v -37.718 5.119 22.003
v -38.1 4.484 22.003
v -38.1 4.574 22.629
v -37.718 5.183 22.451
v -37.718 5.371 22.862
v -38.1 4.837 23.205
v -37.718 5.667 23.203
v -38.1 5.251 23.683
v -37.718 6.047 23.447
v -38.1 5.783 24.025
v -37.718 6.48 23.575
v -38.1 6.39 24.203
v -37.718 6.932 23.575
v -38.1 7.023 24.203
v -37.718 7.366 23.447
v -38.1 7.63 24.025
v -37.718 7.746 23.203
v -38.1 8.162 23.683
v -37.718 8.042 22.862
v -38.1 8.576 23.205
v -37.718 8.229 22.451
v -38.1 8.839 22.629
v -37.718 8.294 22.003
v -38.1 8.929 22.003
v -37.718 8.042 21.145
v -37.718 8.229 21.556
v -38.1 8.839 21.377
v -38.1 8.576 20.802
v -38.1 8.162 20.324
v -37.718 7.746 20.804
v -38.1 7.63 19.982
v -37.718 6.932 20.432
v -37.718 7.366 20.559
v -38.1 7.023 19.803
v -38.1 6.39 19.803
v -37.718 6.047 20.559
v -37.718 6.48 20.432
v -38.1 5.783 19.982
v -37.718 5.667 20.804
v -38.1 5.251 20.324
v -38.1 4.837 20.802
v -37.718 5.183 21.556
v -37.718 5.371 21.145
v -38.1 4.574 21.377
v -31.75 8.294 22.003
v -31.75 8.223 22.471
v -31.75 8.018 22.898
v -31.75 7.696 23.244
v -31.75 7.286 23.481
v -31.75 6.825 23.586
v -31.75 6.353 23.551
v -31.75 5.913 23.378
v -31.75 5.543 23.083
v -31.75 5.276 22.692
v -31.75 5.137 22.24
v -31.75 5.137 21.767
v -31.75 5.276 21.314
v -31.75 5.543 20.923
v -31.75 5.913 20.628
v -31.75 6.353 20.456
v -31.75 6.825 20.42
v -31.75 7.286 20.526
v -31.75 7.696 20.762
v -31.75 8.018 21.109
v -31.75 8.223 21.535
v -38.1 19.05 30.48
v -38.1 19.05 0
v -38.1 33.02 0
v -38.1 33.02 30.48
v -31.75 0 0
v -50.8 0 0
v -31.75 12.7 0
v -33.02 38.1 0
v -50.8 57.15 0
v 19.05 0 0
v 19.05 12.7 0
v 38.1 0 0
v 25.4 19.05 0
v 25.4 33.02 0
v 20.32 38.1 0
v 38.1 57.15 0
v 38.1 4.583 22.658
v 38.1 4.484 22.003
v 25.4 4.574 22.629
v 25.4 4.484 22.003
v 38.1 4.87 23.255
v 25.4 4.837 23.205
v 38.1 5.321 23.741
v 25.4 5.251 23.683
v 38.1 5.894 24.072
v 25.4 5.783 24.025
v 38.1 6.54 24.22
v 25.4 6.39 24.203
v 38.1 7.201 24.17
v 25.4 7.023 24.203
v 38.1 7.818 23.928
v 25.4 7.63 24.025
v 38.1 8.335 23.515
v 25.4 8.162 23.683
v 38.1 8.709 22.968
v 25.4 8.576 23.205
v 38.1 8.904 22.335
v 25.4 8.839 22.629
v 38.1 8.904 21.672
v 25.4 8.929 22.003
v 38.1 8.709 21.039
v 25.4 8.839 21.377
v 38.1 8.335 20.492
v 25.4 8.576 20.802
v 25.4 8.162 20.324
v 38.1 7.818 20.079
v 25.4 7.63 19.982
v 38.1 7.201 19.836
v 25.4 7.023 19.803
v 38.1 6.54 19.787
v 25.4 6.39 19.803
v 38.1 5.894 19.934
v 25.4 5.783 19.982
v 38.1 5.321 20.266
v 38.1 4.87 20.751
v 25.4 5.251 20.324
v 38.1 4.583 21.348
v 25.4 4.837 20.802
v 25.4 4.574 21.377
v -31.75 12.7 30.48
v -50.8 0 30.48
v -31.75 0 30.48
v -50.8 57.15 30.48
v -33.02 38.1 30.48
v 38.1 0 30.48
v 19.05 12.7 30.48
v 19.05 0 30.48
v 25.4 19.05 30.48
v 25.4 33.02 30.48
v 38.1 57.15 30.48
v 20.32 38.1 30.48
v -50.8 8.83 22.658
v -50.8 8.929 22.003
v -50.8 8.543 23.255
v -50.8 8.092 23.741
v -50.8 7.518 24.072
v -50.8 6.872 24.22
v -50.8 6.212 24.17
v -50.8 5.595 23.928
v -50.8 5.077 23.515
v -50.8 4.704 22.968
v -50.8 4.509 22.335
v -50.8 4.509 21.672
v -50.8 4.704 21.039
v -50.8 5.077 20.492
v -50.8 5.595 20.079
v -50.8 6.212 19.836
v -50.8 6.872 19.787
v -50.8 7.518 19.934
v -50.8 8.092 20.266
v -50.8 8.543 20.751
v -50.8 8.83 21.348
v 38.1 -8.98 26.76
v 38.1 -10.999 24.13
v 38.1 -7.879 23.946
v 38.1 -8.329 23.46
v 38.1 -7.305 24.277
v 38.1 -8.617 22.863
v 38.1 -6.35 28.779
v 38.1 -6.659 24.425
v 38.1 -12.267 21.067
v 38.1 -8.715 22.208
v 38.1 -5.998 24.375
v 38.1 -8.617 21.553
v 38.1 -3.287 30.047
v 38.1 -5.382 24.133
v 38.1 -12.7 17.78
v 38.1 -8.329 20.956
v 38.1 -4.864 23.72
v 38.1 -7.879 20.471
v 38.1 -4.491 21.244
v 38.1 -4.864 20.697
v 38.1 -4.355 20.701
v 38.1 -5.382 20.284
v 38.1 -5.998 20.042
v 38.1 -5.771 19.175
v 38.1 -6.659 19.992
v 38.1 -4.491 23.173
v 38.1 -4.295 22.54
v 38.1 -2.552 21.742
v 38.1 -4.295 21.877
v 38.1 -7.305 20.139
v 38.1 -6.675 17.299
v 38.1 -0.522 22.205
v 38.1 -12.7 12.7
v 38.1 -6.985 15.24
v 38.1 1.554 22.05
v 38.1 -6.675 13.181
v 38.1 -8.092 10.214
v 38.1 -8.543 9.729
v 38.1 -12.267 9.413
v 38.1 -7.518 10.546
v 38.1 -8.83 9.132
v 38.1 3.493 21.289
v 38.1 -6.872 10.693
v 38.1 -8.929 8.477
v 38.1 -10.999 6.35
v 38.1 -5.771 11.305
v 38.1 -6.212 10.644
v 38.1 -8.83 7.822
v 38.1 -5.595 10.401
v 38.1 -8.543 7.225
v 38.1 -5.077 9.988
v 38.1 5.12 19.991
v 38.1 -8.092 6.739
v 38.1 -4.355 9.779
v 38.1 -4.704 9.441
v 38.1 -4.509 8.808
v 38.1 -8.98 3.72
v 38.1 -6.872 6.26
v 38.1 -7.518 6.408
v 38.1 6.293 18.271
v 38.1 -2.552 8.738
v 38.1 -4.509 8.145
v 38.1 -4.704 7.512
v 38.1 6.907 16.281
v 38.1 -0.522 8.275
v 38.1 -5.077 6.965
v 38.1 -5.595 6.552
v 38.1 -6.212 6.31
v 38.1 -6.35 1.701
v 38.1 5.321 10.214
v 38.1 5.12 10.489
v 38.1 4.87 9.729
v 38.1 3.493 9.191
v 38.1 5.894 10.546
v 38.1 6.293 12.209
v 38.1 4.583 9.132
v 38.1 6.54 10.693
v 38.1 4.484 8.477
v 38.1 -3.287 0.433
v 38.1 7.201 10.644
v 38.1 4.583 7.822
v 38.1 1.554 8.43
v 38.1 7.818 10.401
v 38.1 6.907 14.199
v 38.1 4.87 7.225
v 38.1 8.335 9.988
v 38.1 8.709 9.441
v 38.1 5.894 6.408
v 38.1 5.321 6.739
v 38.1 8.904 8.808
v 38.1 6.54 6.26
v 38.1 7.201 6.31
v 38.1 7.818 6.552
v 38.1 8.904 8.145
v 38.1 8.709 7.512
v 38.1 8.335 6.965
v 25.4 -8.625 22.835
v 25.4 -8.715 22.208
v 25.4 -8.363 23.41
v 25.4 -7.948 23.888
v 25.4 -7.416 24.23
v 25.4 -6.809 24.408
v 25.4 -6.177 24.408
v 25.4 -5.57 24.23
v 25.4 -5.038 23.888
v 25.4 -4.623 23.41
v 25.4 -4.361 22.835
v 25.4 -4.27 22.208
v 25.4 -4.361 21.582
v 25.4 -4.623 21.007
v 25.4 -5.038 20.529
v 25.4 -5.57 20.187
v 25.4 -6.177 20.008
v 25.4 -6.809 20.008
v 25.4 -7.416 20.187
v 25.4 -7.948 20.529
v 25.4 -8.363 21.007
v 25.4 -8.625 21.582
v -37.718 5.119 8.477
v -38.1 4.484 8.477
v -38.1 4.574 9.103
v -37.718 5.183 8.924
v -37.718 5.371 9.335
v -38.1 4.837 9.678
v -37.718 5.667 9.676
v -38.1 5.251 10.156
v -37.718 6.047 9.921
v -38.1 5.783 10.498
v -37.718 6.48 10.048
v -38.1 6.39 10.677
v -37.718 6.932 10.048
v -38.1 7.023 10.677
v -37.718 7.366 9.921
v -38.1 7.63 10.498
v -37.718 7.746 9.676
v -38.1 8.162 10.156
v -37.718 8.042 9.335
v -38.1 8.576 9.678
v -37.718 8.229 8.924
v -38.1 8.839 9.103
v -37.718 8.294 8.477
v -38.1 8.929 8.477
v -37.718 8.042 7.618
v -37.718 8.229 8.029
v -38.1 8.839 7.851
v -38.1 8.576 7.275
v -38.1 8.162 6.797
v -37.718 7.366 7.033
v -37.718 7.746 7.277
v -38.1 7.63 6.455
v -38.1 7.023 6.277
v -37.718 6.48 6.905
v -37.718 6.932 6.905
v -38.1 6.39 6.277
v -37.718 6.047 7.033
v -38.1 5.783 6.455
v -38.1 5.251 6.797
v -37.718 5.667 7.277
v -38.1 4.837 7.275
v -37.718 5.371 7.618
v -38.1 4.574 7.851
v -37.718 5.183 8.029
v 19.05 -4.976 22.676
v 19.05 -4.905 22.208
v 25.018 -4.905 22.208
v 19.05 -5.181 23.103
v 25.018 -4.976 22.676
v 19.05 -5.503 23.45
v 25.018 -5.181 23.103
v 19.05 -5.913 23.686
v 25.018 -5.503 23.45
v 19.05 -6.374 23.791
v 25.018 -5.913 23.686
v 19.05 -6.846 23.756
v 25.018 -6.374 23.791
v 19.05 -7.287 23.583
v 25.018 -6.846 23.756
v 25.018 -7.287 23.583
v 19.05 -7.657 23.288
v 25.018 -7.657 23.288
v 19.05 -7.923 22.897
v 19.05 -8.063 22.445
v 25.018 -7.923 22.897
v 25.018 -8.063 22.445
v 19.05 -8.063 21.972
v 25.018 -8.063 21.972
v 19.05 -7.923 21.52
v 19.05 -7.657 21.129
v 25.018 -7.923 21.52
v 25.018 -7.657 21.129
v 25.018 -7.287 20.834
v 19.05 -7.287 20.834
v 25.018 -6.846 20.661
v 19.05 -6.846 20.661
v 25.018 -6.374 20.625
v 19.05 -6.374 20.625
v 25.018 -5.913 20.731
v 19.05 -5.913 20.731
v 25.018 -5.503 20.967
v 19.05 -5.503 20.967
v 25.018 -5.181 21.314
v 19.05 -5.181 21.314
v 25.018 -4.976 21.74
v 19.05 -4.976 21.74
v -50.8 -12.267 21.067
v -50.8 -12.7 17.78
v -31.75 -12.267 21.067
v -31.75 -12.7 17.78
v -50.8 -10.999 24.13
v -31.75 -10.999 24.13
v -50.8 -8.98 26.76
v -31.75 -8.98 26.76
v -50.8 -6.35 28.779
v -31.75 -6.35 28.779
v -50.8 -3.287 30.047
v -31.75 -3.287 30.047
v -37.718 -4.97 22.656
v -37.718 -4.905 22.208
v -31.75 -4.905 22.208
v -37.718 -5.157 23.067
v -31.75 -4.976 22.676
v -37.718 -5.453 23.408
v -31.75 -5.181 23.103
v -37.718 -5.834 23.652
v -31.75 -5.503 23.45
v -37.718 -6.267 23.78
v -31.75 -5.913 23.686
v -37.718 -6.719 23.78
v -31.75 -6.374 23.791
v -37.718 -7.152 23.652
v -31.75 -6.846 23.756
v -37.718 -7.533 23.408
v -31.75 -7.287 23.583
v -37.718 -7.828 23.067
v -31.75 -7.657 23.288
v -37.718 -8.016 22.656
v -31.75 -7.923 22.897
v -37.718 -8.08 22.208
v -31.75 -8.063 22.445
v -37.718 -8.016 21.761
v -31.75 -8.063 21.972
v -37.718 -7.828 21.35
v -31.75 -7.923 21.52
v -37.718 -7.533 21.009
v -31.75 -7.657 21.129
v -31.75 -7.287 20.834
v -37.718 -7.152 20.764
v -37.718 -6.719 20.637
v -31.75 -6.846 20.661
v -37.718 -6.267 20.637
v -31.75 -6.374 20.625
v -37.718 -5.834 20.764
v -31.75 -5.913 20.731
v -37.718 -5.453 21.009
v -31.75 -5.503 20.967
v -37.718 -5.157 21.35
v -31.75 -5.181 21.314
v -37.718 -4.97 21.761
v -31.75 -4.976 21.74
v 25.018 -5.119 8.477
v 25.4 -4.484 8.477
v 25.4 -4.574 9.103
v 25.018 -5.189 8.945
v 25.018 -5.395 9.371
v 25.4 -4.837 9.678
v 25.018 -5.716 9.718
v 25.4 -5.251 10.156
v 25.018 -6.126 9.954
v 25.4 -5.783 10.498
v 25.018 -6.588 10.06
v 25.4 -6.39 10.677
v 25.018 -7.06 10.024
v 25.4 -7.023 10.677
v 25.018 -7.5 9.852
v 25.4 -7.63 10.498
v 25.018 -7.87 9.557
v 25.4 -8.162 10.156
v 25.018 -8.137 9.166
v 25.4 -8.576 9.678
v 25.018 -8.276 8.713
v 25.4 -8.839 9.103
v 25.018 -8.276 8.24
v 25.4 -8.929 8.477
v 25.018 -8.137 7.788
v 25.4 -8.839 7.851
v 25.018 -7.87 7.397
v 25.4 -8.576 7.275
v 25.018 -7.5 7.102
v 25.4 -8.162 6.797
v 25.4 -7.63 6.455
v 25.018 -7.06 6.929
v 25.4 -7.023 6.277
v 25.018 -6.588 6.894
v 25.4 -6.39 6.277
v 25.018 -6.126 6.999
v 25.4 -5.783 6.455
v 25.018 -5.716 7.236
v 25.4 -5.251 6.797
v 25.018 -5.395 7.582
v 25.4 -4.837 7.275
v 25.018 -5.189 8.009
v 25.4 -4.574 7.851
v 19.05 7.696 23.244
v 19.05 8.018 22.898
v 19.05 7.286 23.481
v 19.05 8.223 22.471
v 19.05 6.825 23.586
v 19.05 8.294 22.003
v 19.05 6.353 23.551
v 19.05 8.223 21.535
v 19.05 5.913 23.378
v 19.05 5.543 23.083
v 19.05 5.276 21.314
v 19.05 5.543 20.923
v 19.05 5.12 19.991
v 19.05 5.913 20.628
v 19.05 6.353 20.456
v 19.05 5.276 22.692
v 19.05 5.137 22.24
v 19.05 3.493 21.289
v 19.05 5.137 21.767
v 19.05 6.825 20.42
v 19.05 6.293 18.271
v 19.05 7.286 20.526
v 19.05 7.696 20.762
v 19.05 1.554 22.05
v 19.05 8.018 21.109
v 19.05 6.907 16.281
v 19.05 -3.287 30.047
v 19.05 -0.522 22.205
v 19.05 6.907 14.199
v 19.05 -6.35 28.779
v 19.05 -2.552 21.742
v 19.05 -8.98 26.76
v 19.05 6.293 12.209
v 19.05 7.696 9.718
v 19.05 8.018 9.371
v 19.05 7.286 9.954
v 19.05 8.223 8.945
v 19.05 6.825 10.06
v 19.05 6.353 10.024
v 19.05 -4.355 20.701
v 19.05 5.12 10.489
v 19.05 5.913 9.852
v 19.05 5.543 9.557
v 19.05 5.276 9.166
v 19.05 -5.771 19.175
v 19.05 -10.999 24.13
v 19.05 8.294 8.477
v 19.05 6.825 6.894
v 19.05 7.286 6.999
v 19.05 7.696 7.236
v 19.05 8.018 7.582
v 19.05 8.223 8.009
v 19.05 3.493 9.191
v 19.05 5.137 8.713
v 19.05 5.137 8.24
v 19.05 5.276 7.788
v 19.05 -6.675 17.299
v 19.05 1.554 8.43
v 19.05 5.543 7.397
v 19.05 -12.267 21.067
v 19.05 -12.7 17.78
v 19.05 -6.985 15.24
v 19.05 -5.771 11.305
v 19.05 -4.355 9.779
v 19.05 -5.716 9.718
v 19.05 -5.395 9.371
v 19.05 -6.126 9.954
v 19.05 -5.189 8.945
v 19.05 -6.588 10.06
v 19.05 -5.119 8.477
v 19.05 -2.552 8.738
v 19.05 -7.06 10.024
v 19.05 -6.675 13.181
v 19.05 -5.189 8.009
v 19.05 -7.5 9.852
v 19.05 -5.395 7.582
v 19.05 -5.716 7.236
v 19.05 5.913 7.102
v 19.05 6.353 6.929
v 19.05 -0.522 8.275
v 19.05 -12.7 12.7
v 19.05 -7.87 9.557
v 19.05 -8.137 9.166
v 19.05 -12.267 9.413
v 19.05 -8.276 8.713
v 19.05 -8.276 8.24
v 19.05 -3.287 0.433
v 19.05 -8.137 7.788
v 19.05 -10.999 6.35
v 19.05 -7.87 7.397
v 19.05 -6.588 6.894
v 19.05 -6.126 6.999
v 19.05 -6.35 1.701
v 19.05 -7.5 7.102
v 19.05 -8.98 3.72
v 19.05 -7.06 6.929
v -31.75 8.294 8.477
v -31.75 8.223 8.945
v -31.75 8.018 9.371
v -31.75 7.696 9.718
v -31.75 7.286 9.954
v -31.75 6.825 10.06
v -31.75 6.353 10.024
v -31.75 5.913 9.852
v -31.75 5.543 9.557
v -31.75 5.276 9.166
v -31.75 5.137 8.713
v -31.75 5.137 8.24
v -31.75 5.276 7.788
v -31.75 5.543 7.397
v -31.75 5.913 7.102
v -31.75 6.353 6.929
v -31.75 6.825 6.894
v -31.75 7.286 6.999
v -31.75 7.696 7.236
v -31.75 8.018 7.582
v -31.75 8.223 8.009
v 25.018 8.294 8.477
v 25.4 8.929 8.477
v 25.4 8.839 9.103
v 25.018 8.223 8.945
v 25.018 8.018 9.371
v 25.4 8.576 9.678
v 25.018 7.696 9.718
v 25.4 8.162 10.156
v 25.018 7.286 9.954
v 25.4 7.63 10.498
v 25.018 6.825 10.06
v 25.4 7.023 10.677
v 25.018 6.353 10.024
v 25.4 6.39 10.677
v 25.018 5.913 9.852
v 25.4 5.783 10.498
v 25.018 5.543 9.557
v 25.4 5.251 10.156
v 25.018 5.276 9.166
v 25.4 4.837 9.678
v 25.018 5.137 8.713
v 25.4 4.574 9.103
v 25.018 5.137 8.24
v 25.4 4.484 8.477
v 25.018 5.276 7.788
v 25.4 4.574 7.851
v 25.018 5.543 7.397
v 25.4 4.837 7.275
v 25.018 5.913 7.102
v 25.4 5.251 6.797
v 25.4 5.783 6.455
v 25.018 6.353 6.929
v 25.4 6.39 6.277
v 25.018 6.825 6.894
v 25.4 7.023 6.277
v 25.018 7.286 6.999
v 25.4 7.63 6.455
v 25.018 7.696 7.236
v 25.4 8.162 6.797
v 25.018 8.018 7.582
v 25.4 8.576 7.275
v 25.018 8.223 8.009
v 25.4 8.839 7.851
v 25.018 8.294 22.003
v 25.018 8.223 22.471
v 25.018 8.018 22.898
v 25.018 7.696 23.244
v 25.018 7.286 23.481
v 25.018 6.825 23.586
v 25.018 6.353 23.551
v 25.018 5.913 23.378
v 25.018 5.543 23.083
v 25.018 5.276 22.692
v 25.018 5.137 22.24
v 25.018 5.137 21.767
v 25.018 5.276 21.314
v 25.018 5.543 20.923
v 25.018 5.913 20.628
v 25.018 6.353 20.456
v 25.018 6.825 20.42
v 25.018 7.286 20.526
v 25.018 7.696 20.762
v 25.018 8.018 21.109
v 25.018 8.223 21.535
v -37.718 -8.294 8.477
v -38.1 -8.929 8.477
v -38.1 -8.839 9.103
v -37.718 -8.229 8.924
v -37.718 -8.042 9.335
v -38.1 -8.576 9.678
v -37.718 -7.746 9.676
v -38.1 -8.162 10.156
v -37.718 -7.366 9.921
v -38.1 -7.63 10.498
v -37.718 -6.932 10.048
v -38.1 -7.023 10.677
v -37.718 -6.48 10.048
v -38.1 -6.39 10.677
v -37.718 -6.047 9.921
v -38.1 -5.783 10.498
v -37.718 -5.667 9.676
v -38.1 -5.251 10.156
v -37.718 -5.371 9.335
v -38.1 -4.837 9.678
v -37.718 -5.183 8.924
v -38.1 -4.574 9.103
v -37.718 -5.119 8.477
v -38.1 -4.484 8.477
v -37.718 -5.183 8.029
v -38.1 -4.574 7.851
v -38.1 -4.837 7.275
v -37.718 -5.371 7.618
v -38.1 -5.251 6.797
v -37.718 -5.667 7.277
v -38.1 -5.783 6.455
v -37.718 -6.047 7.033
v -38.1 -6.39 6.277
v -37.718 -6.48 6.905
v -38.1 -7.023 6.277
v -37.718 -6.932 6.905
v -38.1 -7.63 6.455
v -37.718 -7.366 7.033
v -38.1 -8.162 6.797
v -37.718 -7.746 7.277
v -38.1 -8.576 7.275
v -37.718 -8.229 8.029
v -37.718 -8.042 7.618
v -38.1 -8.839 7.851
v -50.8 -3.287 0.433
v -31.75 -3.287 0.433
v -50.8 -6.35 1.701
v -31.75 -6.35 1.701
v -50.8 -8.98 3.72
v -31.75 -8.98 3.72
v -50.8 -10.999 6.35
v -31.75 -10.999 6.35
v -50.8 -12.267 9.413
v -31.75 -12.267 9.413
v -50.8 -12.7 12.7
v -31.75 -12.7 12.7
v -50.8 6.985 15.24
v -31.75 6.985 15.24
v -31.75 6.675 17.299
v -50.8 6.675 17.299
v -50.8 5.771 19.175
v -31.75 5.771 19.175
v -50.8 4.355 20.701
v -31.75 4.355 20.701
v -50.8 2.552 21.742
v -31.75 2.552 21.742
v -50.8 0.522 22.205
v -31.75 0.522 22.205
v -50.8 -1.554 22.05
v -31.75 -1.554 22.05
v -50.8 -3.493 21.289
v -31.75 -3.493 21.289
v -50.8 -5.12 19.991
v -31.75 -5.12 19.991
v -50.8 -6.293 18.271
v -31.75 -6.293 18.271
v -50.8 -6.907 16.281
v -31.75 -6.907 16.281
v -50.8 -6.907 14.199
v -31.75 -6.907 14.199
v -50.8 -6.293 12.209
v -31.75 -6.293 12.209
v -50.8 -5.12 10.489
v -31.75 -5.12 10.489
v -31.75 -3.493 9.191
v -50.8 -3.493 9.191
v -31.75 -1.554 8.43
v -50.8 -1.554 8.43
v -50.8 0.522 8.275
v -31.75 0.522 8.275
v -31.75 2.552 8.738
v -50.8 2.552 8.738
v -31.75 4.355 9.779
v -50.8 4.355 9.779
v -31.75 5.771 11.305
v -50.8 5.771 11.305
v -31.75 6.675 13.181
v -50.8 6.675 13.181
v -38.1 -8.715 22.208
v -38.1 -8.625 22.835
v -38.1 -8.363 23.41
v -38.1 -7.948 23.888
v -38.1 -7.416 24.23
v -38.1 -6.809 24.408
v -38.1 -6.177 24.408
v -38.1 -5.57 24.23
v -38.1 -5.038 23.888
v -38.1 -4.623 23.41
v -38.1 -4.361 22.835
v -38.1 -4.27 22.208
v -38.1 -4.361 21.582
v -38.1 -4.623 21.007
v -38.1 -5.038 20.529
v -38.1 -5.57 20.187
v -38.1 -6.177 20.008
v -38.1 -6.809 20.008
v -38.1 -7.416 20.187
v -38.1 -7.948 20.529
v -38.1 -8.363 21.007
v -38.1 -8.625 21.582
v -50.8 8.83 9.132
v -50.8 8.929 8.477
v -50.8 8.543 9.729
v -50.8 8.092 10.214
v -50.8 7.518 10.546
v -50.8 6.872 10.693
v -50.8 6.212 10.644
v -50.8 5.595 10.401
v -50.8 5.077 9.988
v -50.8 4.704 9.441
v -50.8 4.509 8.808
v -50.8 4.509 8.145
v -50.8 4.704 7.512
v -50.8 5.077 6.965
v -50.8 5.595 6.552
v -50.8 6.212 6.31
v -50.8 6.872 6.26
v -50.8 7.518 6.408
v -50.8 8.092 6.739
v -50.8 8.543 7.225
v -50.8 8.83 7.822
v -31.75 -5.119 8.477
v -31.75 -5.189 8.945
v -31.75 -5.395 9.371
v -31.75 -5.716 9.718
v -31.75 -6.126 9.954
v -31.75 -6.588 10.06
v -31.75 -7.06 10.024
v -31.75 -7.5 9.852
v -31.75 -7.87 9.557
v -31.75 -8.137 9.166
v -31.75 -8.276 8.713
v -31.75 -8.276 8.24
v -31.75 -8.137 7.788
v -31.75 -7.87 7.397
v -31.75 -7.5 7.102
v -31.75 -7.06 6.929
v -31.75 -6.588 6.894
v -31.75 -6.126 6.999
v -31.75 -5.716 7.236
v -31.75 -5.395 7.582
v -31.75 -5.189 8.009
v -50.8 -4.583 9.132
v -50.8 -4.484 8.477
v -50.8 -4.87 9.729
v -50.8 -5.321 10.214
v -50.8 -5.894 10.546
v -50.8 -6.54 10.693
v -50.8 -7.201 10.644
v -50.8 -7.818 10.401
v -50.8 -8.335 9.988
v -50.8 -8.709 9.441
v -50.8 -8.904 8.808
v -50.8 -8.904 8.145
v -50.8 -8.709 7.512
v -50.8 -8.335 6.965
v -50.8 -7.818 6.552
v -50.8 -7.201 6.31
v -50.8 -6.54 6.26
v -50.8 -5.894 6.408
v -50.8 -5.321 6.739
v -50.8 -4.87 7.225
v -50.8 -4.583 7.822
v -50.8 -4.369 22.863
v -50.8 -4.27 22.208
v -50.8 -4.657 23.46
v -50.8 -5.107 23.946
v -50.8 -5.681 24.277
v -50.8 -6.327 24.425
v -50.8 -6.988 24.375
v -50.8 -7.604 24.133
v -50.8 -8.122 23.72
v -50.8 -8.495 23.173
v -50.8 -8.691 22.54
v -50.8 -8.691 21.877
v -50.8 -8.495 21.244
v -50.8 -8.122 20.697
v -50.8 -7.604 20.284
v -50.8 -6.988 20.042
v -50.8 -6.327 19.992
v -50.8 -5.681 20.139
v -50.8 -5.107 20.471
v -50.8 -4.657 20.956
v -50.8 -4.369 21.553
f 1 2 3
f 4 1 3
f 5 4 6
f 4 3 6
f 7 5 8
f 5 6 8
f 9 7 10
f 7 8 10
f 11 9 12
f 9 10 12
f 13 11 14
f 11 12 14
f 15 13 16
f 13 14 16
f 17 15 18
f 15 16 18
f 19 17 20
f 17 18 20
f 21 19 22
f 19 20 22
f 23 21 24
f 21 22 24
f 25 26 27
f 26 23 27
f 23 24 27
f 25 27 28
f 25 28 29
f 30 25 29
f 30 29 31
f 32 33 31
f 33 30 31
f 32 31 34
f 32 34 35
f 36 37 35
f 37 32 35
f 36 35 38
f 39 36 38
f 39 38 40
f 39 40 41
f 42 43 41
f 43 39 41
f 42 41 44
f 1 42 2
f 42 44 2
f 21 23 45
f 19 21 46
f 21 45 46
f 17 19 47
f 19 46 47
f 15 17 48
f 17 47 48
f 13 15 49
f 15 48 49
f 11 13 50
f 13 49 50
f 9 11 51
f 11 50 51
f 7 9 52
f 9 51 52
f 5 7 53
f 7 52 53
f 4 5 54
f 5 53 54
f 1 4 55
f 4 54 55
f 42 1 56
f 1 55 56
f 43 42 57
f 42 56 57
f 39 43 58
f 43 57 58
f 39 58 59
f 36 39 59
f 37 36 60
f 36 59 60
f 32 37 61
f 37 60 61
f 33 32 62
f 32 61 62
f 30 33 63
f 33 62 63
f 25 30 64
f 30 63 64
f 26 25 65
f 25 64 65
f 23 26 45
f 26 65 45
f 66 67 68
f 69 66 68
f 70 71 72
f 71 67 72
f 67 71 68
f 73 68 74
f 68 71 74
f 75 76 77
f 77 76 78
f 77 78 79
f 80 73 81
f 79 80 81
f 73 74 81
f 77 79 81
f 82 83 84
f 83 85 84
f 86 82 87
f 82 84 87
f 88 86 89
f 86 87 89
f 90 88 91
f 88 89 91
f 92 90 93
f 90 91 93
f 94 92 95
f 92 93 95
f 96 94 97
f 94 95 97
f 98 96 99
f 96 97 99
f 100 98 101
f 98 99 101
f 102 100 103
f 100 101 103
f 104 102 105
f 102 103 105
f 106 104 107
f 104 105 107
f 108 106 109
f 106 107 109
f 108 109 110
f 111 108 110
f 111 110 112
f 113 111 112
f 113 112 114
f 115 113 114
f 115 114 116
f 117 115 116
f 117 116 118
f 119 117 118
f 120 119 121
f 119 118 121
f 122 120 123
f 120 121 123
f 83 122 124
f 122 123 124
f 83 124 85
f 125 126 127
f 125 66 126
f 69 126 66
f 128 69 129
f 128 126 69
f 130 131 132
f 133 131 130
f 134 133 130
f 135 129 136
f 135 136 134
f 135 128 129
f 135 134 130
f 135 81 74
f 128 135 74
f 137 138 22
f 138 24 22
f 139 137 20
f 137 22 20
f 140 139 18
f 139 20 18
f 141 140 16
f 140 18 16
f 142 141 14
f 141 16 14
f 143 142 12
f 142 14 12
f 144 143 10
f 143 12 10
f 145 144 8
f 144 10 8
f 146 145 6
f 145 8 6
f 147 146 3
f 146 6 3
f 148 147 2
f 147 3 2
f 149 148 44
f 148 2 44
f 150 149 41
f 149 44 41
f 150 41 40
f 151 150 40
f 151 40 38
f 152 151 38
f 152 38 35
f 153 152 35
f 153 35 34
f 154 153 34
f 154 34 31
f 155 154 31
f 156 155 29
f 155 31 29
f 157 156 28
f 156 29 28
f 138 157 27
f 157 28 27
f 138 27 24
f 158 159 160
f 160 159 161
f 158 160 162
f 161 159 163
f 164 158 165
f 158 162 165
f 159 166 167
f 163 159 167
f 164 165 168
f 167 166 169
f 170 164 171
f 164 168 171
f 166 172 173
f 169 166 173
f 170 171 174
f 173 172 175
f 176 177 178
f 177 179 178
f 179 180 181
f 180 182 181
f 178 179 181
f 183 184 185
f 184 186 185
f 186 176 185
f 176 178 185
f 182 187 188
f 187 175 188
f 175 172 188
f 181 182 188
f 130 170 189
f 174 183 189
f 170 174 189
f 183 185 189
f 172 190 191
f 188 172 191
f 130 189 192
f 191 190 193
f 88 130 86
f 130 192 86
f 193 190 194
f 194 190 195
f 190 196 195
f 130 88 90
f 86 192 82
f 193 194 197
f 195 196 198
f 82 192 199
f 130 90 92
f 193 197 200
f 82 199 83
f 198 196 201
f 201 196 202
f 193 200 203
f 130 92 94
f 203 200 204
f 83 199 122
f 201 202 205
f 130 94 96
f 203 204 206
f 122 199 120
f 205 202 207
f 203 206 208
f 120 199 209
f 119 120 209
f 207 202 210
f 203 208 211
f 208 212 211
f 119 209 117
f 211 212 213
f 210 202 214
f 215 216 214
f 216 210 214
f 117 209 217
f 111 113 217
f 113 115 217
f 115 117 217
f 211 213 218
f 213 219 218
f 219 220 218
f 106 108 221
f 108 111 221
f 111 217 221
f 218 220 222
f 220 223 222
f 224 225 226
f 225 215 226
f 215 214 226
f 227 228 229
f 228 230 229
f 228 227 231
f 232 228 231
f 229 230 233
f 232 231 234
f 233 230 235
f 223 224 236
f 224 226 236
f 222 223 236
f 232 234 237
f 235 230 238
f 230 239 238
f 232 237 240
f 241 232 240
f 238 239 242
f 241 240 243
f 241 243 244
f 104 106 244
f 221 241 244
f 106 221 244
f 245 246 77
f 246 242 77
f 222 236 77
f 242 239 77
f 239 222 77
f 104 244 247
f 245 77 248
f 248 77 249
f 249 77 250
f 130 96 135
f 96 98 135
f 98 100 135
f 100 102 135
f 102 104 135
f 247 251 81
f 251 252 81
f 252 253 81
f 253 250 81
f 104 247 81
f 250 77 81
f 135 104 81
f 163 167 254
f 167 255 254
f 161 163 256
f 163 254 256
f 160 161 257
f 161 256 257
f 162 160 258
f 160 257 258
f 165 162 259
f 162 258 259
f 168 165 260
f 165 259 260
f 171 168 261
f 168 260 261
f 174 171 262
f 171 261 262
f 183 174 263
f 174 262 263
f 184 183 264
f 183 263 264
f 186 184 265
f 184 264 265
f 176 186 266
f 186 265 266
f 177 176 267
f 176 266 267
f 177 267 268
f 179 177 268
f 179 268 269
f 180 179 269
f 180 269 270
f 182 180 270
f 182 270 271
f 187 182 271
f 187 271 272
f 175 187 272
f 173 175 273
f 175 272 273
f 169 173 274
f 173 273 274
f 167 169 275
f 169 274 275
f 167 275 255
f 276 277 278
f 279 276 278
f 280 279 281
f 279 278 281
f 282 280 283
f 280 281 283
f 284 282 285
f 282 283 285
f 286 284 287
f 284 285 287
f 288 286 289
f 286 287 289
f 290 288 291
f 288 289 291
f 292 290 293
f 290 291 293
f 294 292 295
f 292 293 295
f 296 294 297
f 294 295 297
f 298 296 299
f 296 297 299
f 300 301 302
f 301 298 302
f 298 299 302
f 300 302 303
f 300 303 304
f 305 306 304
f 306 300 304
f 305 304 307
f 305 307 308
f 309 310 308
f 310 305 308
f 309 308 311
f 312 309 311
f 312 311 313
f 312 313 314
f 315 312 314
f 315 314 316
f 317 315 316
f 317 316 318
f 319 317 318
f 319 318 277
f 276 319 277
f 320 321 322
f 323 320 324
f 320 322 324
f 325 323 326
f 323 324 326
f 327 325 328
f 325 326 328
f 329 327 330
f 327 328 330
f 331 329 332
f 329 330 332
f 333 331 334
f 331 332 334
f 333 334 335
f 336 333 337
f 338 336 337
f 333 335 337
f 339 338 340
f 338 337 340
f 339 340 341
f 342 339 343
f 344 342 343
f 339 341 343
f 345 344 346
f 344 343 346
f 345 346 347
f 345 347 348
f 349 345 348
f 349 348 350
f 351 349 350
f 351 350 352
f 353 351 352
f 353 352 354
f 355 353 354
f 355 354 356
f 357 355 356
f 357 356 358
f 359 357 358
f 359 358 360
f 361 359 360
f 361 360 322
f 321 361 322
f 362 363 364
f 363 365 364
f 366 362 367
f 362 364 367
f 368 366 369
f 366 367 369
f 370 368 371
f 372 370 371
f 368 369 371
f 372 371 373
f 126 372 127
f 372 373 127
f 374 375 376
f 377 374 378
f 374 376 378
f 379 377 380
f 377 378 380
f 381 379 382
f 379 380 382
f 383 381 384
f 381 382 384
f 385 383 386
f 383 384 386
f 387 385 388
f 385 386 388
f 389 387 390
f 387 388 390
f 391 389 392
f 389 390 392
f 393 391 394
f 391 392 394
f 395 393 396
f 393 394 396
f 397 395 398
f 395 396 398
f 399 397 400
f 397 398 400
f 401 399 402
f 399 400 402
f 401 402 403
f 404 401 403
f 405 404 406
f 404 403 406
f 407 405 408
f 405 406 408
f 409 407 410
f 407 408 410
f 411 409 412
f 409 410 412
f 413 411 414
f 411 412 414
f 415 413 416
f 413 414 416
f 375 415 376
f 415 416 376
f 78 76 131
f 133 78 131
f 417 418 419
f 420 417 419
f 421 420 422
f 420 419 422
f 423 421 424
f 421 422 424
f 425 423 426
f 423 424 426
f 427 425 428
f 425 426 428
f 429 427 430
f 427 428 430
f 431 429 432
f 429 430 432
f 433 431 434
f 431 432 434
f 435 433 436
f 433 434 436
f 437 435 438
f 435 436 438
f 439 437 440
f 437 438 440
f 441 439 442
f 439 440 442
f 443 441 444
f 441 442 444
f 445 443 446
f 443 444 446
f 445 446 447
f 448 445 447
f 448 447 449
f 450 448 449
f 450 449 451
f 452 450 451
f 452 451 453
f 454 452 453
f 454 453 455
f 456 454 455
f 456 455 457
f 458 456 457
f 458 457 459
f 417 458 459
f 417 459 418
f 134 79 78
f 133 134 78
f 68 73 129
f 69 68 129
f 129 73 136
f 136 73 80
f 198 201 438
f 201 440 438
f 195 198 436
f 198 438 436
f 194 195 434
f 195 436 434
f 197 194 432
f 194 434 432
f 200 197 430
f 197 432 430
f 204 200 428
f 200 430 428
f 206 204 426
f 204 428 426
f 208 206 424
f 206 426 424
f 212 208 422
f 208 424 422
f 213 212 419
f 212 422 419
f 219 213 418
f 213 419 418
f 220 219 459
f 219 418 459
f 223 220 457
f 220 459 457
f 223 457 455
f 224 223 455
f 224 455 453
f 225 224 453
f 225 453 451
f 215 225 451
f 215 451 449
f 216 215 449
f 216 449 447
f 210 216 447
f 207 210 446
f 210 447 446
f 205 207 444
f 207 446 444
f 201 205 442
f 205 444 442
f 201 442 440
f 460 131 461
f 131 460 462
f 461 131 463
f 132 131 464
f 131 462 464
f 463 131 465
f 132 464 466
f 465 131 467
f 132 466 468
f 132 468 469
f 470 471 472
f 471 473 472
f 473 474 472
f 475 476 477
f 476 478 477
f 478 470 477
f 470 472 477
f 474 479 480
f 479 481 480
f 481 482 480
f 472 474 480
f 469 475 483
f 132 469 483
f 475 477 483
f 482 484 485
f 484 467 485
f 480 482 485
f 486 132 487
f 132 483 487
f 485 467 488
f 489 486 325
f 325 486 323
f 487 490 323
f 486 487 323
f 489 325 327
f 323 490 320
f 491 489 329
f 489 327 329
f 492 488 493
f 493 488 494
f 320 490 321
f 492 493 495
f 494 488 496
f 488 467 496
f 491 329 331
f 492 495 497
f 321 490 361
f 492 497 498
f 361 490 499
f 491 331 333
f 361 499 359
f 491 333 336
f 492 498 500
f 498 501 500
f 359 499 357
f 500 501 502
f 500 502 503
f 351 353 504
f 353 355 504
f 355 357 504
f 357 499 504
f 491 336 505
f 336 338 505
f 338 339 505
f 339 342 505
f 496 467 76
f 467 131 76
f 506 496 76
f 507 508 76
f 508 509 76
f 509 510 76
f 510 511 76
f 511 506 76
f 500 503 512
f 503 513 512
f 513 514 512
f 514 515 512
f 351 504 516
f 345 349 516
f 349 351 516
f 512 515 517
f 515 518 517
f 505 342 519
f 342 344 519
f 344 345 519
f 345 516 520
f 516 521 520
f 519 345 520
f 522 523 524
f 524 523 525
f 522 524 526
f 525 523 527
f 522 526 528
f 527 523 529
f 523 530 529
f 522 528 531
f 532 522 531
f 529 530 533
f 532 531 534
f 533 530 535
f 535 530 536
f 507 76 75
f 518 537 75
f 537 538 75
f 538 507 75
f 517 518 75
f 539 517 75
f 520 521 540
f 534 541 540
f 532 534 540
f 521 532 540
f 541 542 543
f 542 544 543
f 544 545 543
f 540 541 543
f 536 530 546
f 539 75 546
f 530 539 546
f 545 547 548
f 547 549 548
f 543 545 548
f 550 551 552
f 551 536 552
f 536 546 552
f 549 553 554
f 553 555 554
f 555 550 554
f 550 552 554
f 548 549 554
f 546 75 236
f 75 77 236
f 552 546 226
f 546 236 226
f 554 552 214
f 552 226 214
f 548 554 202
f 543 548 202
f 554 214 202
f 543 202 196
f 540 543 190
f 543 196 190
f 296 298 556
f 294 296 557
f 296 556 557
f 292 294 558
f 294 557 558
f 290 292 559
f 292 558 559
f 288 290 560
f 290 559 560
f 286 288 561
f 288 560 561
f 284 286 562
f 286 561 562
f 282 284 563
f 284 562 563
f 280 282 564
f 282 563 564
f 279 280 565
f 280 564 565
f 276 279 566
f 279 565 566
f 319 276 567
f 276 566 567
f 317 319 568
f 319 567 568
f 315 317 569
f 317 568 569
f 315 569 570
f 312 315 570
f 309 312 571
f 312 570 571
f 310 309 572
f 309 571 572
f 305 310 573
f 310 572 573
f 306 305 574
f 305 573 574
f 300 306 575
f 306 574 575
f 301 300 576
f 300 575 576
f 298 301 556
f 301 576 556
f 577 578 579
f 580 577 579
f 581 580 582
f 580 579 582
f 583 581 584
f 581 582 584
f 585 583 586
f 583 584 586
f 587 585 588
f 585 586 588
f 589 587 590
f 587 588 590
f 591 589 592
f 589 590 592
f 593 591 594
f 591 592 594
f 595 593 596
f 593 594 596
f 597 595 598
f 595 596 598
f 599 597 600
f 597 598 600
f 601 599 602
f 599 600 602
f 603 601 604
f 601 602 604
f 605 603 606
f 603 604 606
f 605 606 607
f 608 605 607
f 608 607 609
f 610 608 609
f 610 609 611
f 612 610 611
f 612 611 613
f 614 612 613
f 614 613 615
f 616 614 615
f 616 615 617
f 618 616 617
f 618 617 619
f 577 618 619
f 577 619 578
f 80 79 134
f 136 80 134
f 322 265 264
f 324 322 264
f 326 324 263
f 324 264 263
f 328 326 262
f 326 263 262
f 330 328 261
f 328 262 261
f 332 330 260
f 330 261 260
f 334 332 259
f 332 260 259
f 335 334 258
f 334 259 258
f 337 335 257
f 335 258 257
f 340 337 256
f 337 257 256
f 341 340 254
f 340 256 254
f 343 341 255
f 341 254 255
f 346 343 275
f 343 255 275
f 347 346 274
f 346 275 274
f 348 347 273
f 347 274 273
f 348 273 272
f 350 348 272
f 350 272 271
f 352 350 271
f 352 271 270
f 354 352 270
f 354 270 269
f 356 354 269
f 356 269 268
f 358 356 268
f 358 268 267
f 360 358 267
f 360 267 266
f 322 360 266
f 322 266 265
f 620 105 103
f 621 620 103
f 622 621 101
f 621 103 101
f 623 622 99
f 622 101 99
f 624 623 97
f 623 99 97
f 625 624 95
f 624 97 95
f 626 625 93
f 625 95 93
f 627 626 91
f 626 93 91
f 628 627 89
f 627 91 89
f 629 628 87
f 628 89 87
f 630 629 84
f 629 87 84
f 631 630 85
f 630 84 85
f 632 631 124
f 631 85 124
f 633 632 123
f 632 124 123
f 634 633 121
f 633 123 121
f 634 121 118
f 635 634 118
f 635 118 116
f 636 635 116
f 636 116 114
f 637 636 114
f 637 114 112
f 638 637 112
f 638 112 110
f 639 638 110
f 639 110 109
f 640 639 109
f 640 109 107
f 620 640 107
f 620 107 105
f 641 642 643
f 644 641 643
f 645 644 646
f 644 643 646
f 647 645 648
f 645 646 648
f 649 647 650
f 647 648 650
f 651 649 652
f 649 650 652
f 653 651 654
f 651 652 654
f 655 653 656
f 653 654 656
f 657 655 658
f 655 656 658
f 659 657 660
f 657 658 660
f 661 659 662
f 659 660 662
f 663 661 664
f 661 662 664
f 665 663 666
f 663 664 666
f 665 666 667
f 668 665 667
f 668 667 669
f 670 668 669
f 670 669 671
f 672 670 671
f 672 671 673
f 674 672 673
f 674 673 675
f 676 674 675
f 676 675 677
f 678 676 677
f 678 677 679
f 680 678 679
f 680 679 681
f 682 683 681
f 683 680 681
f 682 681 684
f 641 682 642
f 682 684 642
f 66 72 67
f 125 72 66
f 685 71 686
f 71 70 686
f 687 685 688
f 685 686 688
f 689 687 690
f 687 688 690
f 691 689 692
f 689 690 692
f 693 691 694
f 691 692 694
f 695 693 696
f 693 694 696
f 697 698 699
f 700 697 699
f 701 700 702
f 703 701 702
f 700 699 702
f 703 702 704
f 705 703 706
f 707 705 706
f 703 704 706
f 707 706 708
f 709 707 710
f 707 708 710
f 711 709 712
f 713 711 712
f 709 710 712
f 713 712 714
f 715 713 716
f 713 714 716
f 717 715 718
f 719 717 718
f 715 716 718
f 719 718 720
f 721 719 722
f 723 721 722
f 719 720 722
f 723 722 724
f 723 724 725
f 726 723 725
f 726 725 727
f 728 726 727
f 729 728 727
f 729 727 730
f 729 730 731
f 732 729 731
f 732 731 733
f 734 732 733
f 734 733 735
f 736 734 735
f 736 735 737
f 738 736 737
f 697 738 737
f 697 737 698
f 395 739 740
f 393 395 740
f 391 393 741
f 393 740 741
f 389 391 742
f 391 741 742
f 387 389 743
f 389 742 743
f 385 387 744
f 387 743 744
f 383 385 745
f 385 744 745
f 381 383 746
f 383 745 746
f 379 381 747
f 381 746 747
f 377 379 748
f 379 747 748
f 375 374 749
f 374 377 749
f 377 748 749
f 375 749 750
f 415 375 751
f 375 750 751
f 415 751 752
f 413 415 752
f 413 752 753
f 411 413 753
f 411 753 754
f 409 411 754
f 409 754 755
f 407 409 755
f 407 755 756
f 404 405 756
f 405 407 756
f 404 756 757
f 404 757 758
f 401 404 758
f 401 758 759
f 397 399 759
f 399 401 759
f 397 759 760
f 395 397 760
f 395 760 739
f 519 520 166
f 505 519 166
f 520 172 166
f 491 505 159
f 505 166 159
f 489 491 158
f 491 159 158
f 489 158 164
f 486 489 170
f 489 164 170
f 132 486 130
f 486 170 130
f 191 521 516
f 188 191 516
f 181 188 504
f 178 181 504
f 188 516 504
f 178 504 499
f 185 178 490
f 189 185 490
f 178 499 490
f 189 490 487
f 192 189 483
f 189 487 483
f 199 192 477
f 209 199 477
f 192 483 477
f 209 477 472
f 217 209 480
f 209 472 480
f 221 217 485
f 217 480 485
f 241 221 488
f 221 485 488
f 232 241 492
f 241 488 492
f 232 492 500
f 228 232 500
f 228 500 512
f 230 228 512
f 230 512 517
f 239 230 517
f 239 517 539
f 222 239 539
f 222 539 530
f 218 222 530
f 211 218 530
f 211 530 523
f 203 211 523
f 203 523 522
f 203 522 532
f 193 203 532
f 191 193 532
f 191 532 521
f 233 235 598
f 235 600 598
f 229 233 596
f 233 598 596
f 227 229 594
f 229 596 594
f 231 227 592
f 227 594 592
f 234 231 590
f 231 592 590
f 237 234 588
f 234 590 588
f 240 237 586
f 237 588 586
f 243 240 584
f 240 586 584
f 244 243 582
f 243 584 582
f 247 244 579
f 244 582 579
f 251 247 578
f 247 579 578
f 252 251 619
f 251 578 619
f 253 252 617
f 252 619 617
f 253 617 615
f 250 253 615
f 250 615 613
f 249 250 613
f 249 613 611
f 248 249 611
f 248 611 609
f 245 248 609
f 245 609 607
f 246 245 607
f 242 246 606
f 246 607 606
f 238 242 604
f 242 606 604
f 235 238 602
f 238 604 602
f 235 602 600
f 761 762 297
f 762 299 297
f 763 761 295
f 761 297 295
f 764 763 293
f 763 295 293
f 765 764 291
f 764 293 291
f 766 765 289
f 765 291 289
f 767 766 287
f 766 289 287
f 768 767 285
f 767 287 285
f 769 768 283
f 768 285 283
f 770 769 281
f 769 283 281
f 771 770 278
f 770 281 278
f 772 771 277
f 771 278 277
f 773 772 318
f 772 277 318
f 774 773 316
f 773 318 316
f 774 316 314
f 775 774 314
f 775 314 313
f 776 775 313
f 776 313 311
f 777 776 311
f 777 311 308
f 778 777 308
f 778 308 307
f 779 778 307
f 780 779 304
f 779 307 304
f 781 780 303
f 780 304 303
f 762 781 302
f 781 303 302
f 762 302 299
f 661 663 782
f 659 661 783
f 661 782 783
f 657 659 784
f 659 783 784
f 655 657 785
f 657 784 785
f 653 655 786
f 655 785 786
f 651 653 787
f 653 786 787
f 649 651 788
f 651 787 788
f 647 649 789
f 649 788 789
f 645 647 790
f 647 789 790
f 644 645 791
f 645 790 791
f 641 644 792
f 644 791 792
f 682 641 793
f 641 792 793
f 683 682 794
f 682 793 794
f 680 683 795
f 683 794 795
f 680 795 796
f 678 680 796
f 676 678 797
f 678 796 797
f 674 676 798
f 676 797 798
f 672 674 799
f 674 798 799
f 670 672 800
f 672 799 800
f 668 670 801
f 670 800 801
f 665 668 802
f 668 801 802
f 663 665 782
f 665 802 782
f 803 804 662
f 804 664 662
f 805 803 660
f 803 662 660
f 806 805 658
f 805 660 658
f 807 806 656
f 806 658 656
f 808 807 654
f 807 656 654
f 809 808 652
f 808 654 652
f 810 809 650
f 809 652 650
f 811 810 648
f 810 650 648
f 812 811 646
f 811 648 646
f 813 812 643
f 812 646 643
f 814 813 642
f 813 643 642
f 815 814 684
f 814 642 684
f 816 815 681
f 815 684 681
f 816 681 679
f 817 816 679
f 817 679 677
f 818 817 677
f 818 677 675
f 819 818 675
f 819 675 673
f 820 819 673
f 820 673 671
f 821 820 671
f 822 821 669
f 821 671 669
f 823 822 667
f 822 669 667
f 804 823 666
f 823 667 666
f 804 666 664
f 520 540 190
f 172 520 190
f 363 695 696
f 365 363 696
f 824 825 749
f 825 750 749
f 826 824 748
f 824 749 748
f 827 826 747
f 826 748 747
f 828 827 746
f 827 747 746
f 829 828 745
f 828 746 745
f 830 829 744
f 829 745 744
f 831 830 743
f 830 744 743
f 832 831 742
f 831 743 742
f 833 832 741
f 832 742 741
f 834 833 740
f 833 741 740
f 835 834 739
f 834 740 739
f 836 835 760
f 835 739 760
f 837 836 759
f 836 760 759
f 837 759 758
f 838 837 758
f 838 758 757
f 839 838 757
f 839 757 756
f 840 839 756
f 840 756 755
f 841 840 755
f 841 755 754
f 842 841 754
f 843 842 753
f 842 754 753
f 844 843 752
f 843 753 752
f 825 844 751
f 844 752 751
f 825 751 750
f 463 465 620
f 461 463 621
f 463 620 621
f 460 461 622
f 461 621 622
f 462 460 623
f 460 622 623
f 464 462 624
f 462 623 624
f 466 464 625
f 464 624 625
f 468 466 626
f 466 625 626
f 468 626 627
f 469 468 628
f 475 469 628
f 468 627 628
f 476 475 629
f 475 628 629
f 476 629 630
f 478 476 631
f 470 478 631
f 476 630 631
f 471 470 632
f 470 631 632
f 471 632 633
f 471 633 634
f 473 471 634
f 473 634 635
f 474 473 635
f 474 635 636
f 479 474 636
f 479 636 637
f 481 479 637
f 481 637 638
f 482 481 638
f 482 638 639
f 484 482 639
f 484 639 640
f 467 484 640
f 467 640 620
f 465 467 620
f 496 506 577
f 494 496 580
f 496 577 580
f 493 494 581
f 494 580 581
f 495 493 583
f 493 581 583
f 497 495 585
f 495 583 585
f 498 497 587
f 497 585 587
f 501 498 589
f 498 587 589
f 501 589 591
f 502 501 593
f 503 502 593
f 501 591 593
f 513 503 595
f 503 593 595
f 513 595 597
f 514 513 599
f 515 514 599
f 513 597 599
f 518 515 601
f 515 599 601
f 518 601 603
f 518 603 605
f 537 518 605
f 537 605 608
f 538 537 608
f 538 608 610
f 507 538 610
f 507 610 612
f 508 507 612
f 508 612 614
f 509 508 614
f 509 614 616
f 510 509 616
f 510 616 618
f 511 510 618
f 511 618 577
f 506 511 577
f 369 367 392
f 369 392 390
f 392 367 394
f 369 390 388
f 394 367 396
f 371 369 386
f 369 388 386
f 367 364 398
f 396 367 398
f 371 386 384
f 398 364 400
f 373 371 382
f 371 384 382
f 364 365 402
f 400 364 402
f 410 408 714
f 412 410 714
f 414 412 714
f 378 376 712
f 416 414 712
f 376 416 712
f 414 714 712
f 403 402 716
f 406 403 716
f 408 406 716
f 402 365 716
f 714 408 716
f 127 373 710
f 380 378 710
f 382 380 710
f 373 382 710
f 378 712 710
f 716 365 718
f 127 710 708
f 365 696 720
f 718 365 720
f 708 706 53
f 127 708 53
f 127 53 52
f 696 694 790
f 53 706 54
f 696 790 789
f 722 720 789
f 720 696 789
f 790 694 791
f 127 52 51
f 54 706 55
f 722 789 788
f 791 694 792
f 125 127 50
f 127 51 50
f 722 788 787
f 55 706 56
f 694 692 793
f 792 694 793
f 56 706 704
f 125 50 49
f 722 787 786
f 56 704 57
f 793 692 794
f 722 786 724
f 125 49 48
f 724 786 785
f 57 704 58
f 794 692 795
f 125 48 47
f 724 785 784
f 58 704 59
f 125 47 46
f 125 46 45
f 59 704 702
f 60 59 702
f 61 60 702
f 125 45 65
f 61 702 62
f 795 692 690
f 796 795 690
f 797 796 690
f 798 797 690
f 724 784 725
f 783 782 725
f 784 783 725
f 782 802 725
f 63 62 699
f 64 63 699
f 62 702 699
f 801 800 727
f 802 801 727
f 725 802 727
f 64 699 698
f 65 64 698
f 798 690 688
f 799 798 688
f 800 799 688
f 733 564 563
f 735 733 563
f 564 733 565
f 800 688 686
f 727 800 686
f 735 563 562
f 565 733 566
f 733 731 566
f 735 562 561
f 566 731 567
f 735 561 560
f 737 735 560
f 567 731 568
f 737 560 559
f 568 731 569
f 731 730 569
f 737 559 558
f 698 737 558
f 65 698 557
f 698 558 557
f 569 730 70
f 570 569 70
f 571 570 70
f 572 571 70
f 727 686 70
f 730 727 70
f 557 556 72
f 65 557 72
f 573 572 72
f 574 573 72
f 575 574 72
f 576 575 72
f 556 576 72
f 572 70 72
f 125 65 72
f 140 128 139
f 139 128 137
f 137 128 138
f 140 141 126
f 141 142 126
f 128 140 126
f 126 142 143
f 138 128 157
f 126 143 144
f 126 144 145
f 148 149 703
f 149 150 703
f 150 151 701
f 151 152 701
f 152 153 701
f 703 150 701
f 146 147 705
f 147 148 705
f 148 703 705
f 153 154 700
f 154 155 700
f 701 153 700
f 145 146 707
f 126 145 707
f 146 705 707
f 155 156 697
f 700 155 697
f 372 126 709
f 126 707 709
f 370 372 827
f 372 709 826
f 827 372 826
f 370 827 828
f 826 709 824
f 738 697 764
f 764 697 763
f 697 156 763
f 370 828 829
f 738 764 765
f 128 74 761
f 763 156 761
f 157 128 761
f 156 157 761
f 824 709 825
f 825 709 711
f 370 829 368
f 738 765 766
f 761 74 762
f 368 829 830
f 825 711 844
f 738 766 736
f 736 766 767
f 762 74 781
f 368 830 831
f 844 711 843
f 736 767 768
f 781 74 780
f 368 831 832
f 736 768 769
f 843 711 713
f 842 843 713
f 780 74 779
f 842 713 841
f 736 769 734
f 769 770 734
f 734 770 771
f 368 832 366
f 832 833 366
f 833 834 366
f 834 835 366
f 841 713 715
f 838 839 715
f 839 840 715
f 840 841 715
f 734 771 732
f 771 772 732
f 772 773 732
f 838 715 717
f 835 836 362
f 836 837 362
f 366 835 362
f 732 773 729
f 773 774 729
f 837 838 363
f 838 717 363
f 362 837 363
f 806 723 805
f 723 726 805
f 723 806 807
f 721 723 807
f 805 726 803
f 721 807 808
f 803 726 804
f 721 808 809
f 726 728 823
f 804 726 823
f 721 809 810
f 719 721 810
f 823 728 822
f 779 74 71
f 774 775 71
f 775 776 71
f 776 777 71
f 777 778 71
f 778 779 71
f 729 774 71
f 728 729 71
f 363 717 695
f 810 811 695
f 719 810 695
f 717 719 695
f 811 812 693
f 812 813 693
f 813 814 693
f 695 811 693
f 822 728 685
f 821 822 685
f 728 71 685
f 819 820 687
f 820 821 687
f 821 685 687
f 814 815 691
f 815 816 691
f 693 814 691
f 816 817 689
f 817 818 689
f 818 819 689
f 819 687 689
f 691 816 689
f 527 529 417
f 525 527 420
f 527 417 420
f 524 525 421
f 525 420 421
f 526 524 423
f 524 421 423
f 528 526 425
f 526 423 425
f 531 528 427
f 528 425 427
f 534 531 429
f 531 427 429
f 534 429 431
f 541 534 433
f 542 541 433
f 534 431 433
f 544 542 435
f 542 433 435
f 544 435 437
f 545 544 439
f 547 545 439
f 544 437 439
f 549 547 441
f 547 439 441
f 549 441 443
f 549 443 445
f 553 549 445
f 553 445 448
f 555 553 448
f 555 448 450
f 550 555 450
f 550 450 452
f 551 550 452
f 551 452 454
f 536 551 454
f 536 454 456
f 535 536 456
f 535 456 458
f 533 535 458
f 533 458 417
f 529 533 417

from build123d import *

# Parameters (mm, degrees)
F1_DEPTH       = 30.48
F4_D           = 13.97
F4_DEPTH       = 19.051
F4_ON_F2_D     = 13.97
F4_ON_F2_DEPTH = 19.051
F6_D           = 3.175
F8_SIZE        = 5.08
F9_SIZE        = 6.34999
F10_D          = 4.445
F10_DEPTH      = 12.7
F10_TIP        = 1.3354127258
F12_D          = 4.445
F12_DEPTH      = 12.7
F12_TIP        = 1.3354127258
F13_R          = 12.7


# Not quite as in the source:
# - a fillet or chamfer is up to 0.001 mm smaller than in the source, because OpenCascade refuses the exact size
# - a feature names something its author has since deleted; it is built from what else it names


with BuildPart() as f1:
    # F0 (on Top) → F1 (new body)
    with BuildSketch(Plane.XY):
        Polygon((38.1, 57.15), (-50.8, 57.15), (-50.8, -12.7), (-31.75, -12.7), (-31.75, 12.7), (-38.1, 12.7), (-38.1, 38.1), (25.4, 38.1), (25.4, 12.7), (19.05, 12.7), (19.05, -12.7), (38.1, -12.7), align=None)
    extrude(amount=F1_DEPTH)

    # F4 (through all, one way)
    with BuildSketch(Plane(origin=(19.05, 0, 0), x_dir=(0, -1, 0), z_dir=(-1, 0, 0))):
        with Locations((0, 15.24)):
            Circle(F4_D / 2)
    extrude(amount=-F4_DEPTH, mode=Mode.SUBTRACT)

    # F4 on F2 (through all, one way)
    with BuildSketch(Plane.YZ.offset(-31.75)):
        with Locations((0, 15.24)):
            Circle(F4_ON_F2_D / 2)
    extrude(amount=-F4_ON_F2_DEPTH, mode=Mode.SUBTRACT)

    # F6 (through all)
    with Locations(Plane(origin=(-50.8, 0, 0), x_dir=(0, -1, 0), z_dir=(-1, 0, 0))):
        with Locations((-6.706288951, 22.003272388), (6.4929844043, 22.2083615897), (6.706288951, 8.476727612), (-6.706288951, 8.476727612)):
            Hole(F6_D / 2)

    # F8
    f8_edges = [f1.edges().sort_by_distance(p)[0] for p in [
        (-38.1, 38.1, 15.24),
        (25.4, 38.1, 15.24),
    ]]
    chamfer(f8_edges, length=F8_SIZE)

    # F9 (size 6.35 in the source; OpenCascade refuses exactly that, so slightly less here)
    f9_edges = [f1.edges().sort_by_distance(p)[0] for p in [
        (25.4, 12.7, 15.24),
        (-38.1, 12.7, 15.24),
    ]]
    chamfer(f9_edges, length=F9_SIZE)

    # F10
    with Locations(Plane(origin=(-50.8, 0, 0), x_dir=(0, -1, 0), z_dir=(-1, 0, 0))):
        with Locations((6.4929844043, 22.2083615897), (6.706288951, 8.476727612), (-6.706288951, 8.476727612), (-6.706288951, 22.003272388)):
            Hole(F10_D / 2, depth=F10_DEPTH)
            with Locations((0, 0, -(F10_DEPTH + F10_TIP / 2))):  # 118° drill point
                Cone(0, F10_D / 2, F10_TIP, mode=Mode.SUBTRACT)

    # F12
    with Locations(Plane.YZ.offset(38.1)):
        with Locations((-6.706288951, 8.476727612), (-6.4929844043, 22.2083615897), (6.706288951, 22.003272388), (6.706288951, 8.476727612)):
            Hole(F12_D / 2, depth=F12_DEPTH)
            with Locations((0, 0, -(F12_DEPTH + F12_TIP / 2))):  # 118° drill point
                Cone(0, F12_D / 2, F12_TIP, mode=Mode.SUBTRACT)

    # F13
    f13_edges = [f1.edges().sort_by_distance(p)[0] for p in [
        (-41.275, -12.7, 30.48),
        (28.575, -12.7, 30.48),
        (28.575, -12.7, 0),
        (-41.275, -12.7, 0),
    ]]
    fillet(f13_edges, radius=F13_R)


solid = f1.part
